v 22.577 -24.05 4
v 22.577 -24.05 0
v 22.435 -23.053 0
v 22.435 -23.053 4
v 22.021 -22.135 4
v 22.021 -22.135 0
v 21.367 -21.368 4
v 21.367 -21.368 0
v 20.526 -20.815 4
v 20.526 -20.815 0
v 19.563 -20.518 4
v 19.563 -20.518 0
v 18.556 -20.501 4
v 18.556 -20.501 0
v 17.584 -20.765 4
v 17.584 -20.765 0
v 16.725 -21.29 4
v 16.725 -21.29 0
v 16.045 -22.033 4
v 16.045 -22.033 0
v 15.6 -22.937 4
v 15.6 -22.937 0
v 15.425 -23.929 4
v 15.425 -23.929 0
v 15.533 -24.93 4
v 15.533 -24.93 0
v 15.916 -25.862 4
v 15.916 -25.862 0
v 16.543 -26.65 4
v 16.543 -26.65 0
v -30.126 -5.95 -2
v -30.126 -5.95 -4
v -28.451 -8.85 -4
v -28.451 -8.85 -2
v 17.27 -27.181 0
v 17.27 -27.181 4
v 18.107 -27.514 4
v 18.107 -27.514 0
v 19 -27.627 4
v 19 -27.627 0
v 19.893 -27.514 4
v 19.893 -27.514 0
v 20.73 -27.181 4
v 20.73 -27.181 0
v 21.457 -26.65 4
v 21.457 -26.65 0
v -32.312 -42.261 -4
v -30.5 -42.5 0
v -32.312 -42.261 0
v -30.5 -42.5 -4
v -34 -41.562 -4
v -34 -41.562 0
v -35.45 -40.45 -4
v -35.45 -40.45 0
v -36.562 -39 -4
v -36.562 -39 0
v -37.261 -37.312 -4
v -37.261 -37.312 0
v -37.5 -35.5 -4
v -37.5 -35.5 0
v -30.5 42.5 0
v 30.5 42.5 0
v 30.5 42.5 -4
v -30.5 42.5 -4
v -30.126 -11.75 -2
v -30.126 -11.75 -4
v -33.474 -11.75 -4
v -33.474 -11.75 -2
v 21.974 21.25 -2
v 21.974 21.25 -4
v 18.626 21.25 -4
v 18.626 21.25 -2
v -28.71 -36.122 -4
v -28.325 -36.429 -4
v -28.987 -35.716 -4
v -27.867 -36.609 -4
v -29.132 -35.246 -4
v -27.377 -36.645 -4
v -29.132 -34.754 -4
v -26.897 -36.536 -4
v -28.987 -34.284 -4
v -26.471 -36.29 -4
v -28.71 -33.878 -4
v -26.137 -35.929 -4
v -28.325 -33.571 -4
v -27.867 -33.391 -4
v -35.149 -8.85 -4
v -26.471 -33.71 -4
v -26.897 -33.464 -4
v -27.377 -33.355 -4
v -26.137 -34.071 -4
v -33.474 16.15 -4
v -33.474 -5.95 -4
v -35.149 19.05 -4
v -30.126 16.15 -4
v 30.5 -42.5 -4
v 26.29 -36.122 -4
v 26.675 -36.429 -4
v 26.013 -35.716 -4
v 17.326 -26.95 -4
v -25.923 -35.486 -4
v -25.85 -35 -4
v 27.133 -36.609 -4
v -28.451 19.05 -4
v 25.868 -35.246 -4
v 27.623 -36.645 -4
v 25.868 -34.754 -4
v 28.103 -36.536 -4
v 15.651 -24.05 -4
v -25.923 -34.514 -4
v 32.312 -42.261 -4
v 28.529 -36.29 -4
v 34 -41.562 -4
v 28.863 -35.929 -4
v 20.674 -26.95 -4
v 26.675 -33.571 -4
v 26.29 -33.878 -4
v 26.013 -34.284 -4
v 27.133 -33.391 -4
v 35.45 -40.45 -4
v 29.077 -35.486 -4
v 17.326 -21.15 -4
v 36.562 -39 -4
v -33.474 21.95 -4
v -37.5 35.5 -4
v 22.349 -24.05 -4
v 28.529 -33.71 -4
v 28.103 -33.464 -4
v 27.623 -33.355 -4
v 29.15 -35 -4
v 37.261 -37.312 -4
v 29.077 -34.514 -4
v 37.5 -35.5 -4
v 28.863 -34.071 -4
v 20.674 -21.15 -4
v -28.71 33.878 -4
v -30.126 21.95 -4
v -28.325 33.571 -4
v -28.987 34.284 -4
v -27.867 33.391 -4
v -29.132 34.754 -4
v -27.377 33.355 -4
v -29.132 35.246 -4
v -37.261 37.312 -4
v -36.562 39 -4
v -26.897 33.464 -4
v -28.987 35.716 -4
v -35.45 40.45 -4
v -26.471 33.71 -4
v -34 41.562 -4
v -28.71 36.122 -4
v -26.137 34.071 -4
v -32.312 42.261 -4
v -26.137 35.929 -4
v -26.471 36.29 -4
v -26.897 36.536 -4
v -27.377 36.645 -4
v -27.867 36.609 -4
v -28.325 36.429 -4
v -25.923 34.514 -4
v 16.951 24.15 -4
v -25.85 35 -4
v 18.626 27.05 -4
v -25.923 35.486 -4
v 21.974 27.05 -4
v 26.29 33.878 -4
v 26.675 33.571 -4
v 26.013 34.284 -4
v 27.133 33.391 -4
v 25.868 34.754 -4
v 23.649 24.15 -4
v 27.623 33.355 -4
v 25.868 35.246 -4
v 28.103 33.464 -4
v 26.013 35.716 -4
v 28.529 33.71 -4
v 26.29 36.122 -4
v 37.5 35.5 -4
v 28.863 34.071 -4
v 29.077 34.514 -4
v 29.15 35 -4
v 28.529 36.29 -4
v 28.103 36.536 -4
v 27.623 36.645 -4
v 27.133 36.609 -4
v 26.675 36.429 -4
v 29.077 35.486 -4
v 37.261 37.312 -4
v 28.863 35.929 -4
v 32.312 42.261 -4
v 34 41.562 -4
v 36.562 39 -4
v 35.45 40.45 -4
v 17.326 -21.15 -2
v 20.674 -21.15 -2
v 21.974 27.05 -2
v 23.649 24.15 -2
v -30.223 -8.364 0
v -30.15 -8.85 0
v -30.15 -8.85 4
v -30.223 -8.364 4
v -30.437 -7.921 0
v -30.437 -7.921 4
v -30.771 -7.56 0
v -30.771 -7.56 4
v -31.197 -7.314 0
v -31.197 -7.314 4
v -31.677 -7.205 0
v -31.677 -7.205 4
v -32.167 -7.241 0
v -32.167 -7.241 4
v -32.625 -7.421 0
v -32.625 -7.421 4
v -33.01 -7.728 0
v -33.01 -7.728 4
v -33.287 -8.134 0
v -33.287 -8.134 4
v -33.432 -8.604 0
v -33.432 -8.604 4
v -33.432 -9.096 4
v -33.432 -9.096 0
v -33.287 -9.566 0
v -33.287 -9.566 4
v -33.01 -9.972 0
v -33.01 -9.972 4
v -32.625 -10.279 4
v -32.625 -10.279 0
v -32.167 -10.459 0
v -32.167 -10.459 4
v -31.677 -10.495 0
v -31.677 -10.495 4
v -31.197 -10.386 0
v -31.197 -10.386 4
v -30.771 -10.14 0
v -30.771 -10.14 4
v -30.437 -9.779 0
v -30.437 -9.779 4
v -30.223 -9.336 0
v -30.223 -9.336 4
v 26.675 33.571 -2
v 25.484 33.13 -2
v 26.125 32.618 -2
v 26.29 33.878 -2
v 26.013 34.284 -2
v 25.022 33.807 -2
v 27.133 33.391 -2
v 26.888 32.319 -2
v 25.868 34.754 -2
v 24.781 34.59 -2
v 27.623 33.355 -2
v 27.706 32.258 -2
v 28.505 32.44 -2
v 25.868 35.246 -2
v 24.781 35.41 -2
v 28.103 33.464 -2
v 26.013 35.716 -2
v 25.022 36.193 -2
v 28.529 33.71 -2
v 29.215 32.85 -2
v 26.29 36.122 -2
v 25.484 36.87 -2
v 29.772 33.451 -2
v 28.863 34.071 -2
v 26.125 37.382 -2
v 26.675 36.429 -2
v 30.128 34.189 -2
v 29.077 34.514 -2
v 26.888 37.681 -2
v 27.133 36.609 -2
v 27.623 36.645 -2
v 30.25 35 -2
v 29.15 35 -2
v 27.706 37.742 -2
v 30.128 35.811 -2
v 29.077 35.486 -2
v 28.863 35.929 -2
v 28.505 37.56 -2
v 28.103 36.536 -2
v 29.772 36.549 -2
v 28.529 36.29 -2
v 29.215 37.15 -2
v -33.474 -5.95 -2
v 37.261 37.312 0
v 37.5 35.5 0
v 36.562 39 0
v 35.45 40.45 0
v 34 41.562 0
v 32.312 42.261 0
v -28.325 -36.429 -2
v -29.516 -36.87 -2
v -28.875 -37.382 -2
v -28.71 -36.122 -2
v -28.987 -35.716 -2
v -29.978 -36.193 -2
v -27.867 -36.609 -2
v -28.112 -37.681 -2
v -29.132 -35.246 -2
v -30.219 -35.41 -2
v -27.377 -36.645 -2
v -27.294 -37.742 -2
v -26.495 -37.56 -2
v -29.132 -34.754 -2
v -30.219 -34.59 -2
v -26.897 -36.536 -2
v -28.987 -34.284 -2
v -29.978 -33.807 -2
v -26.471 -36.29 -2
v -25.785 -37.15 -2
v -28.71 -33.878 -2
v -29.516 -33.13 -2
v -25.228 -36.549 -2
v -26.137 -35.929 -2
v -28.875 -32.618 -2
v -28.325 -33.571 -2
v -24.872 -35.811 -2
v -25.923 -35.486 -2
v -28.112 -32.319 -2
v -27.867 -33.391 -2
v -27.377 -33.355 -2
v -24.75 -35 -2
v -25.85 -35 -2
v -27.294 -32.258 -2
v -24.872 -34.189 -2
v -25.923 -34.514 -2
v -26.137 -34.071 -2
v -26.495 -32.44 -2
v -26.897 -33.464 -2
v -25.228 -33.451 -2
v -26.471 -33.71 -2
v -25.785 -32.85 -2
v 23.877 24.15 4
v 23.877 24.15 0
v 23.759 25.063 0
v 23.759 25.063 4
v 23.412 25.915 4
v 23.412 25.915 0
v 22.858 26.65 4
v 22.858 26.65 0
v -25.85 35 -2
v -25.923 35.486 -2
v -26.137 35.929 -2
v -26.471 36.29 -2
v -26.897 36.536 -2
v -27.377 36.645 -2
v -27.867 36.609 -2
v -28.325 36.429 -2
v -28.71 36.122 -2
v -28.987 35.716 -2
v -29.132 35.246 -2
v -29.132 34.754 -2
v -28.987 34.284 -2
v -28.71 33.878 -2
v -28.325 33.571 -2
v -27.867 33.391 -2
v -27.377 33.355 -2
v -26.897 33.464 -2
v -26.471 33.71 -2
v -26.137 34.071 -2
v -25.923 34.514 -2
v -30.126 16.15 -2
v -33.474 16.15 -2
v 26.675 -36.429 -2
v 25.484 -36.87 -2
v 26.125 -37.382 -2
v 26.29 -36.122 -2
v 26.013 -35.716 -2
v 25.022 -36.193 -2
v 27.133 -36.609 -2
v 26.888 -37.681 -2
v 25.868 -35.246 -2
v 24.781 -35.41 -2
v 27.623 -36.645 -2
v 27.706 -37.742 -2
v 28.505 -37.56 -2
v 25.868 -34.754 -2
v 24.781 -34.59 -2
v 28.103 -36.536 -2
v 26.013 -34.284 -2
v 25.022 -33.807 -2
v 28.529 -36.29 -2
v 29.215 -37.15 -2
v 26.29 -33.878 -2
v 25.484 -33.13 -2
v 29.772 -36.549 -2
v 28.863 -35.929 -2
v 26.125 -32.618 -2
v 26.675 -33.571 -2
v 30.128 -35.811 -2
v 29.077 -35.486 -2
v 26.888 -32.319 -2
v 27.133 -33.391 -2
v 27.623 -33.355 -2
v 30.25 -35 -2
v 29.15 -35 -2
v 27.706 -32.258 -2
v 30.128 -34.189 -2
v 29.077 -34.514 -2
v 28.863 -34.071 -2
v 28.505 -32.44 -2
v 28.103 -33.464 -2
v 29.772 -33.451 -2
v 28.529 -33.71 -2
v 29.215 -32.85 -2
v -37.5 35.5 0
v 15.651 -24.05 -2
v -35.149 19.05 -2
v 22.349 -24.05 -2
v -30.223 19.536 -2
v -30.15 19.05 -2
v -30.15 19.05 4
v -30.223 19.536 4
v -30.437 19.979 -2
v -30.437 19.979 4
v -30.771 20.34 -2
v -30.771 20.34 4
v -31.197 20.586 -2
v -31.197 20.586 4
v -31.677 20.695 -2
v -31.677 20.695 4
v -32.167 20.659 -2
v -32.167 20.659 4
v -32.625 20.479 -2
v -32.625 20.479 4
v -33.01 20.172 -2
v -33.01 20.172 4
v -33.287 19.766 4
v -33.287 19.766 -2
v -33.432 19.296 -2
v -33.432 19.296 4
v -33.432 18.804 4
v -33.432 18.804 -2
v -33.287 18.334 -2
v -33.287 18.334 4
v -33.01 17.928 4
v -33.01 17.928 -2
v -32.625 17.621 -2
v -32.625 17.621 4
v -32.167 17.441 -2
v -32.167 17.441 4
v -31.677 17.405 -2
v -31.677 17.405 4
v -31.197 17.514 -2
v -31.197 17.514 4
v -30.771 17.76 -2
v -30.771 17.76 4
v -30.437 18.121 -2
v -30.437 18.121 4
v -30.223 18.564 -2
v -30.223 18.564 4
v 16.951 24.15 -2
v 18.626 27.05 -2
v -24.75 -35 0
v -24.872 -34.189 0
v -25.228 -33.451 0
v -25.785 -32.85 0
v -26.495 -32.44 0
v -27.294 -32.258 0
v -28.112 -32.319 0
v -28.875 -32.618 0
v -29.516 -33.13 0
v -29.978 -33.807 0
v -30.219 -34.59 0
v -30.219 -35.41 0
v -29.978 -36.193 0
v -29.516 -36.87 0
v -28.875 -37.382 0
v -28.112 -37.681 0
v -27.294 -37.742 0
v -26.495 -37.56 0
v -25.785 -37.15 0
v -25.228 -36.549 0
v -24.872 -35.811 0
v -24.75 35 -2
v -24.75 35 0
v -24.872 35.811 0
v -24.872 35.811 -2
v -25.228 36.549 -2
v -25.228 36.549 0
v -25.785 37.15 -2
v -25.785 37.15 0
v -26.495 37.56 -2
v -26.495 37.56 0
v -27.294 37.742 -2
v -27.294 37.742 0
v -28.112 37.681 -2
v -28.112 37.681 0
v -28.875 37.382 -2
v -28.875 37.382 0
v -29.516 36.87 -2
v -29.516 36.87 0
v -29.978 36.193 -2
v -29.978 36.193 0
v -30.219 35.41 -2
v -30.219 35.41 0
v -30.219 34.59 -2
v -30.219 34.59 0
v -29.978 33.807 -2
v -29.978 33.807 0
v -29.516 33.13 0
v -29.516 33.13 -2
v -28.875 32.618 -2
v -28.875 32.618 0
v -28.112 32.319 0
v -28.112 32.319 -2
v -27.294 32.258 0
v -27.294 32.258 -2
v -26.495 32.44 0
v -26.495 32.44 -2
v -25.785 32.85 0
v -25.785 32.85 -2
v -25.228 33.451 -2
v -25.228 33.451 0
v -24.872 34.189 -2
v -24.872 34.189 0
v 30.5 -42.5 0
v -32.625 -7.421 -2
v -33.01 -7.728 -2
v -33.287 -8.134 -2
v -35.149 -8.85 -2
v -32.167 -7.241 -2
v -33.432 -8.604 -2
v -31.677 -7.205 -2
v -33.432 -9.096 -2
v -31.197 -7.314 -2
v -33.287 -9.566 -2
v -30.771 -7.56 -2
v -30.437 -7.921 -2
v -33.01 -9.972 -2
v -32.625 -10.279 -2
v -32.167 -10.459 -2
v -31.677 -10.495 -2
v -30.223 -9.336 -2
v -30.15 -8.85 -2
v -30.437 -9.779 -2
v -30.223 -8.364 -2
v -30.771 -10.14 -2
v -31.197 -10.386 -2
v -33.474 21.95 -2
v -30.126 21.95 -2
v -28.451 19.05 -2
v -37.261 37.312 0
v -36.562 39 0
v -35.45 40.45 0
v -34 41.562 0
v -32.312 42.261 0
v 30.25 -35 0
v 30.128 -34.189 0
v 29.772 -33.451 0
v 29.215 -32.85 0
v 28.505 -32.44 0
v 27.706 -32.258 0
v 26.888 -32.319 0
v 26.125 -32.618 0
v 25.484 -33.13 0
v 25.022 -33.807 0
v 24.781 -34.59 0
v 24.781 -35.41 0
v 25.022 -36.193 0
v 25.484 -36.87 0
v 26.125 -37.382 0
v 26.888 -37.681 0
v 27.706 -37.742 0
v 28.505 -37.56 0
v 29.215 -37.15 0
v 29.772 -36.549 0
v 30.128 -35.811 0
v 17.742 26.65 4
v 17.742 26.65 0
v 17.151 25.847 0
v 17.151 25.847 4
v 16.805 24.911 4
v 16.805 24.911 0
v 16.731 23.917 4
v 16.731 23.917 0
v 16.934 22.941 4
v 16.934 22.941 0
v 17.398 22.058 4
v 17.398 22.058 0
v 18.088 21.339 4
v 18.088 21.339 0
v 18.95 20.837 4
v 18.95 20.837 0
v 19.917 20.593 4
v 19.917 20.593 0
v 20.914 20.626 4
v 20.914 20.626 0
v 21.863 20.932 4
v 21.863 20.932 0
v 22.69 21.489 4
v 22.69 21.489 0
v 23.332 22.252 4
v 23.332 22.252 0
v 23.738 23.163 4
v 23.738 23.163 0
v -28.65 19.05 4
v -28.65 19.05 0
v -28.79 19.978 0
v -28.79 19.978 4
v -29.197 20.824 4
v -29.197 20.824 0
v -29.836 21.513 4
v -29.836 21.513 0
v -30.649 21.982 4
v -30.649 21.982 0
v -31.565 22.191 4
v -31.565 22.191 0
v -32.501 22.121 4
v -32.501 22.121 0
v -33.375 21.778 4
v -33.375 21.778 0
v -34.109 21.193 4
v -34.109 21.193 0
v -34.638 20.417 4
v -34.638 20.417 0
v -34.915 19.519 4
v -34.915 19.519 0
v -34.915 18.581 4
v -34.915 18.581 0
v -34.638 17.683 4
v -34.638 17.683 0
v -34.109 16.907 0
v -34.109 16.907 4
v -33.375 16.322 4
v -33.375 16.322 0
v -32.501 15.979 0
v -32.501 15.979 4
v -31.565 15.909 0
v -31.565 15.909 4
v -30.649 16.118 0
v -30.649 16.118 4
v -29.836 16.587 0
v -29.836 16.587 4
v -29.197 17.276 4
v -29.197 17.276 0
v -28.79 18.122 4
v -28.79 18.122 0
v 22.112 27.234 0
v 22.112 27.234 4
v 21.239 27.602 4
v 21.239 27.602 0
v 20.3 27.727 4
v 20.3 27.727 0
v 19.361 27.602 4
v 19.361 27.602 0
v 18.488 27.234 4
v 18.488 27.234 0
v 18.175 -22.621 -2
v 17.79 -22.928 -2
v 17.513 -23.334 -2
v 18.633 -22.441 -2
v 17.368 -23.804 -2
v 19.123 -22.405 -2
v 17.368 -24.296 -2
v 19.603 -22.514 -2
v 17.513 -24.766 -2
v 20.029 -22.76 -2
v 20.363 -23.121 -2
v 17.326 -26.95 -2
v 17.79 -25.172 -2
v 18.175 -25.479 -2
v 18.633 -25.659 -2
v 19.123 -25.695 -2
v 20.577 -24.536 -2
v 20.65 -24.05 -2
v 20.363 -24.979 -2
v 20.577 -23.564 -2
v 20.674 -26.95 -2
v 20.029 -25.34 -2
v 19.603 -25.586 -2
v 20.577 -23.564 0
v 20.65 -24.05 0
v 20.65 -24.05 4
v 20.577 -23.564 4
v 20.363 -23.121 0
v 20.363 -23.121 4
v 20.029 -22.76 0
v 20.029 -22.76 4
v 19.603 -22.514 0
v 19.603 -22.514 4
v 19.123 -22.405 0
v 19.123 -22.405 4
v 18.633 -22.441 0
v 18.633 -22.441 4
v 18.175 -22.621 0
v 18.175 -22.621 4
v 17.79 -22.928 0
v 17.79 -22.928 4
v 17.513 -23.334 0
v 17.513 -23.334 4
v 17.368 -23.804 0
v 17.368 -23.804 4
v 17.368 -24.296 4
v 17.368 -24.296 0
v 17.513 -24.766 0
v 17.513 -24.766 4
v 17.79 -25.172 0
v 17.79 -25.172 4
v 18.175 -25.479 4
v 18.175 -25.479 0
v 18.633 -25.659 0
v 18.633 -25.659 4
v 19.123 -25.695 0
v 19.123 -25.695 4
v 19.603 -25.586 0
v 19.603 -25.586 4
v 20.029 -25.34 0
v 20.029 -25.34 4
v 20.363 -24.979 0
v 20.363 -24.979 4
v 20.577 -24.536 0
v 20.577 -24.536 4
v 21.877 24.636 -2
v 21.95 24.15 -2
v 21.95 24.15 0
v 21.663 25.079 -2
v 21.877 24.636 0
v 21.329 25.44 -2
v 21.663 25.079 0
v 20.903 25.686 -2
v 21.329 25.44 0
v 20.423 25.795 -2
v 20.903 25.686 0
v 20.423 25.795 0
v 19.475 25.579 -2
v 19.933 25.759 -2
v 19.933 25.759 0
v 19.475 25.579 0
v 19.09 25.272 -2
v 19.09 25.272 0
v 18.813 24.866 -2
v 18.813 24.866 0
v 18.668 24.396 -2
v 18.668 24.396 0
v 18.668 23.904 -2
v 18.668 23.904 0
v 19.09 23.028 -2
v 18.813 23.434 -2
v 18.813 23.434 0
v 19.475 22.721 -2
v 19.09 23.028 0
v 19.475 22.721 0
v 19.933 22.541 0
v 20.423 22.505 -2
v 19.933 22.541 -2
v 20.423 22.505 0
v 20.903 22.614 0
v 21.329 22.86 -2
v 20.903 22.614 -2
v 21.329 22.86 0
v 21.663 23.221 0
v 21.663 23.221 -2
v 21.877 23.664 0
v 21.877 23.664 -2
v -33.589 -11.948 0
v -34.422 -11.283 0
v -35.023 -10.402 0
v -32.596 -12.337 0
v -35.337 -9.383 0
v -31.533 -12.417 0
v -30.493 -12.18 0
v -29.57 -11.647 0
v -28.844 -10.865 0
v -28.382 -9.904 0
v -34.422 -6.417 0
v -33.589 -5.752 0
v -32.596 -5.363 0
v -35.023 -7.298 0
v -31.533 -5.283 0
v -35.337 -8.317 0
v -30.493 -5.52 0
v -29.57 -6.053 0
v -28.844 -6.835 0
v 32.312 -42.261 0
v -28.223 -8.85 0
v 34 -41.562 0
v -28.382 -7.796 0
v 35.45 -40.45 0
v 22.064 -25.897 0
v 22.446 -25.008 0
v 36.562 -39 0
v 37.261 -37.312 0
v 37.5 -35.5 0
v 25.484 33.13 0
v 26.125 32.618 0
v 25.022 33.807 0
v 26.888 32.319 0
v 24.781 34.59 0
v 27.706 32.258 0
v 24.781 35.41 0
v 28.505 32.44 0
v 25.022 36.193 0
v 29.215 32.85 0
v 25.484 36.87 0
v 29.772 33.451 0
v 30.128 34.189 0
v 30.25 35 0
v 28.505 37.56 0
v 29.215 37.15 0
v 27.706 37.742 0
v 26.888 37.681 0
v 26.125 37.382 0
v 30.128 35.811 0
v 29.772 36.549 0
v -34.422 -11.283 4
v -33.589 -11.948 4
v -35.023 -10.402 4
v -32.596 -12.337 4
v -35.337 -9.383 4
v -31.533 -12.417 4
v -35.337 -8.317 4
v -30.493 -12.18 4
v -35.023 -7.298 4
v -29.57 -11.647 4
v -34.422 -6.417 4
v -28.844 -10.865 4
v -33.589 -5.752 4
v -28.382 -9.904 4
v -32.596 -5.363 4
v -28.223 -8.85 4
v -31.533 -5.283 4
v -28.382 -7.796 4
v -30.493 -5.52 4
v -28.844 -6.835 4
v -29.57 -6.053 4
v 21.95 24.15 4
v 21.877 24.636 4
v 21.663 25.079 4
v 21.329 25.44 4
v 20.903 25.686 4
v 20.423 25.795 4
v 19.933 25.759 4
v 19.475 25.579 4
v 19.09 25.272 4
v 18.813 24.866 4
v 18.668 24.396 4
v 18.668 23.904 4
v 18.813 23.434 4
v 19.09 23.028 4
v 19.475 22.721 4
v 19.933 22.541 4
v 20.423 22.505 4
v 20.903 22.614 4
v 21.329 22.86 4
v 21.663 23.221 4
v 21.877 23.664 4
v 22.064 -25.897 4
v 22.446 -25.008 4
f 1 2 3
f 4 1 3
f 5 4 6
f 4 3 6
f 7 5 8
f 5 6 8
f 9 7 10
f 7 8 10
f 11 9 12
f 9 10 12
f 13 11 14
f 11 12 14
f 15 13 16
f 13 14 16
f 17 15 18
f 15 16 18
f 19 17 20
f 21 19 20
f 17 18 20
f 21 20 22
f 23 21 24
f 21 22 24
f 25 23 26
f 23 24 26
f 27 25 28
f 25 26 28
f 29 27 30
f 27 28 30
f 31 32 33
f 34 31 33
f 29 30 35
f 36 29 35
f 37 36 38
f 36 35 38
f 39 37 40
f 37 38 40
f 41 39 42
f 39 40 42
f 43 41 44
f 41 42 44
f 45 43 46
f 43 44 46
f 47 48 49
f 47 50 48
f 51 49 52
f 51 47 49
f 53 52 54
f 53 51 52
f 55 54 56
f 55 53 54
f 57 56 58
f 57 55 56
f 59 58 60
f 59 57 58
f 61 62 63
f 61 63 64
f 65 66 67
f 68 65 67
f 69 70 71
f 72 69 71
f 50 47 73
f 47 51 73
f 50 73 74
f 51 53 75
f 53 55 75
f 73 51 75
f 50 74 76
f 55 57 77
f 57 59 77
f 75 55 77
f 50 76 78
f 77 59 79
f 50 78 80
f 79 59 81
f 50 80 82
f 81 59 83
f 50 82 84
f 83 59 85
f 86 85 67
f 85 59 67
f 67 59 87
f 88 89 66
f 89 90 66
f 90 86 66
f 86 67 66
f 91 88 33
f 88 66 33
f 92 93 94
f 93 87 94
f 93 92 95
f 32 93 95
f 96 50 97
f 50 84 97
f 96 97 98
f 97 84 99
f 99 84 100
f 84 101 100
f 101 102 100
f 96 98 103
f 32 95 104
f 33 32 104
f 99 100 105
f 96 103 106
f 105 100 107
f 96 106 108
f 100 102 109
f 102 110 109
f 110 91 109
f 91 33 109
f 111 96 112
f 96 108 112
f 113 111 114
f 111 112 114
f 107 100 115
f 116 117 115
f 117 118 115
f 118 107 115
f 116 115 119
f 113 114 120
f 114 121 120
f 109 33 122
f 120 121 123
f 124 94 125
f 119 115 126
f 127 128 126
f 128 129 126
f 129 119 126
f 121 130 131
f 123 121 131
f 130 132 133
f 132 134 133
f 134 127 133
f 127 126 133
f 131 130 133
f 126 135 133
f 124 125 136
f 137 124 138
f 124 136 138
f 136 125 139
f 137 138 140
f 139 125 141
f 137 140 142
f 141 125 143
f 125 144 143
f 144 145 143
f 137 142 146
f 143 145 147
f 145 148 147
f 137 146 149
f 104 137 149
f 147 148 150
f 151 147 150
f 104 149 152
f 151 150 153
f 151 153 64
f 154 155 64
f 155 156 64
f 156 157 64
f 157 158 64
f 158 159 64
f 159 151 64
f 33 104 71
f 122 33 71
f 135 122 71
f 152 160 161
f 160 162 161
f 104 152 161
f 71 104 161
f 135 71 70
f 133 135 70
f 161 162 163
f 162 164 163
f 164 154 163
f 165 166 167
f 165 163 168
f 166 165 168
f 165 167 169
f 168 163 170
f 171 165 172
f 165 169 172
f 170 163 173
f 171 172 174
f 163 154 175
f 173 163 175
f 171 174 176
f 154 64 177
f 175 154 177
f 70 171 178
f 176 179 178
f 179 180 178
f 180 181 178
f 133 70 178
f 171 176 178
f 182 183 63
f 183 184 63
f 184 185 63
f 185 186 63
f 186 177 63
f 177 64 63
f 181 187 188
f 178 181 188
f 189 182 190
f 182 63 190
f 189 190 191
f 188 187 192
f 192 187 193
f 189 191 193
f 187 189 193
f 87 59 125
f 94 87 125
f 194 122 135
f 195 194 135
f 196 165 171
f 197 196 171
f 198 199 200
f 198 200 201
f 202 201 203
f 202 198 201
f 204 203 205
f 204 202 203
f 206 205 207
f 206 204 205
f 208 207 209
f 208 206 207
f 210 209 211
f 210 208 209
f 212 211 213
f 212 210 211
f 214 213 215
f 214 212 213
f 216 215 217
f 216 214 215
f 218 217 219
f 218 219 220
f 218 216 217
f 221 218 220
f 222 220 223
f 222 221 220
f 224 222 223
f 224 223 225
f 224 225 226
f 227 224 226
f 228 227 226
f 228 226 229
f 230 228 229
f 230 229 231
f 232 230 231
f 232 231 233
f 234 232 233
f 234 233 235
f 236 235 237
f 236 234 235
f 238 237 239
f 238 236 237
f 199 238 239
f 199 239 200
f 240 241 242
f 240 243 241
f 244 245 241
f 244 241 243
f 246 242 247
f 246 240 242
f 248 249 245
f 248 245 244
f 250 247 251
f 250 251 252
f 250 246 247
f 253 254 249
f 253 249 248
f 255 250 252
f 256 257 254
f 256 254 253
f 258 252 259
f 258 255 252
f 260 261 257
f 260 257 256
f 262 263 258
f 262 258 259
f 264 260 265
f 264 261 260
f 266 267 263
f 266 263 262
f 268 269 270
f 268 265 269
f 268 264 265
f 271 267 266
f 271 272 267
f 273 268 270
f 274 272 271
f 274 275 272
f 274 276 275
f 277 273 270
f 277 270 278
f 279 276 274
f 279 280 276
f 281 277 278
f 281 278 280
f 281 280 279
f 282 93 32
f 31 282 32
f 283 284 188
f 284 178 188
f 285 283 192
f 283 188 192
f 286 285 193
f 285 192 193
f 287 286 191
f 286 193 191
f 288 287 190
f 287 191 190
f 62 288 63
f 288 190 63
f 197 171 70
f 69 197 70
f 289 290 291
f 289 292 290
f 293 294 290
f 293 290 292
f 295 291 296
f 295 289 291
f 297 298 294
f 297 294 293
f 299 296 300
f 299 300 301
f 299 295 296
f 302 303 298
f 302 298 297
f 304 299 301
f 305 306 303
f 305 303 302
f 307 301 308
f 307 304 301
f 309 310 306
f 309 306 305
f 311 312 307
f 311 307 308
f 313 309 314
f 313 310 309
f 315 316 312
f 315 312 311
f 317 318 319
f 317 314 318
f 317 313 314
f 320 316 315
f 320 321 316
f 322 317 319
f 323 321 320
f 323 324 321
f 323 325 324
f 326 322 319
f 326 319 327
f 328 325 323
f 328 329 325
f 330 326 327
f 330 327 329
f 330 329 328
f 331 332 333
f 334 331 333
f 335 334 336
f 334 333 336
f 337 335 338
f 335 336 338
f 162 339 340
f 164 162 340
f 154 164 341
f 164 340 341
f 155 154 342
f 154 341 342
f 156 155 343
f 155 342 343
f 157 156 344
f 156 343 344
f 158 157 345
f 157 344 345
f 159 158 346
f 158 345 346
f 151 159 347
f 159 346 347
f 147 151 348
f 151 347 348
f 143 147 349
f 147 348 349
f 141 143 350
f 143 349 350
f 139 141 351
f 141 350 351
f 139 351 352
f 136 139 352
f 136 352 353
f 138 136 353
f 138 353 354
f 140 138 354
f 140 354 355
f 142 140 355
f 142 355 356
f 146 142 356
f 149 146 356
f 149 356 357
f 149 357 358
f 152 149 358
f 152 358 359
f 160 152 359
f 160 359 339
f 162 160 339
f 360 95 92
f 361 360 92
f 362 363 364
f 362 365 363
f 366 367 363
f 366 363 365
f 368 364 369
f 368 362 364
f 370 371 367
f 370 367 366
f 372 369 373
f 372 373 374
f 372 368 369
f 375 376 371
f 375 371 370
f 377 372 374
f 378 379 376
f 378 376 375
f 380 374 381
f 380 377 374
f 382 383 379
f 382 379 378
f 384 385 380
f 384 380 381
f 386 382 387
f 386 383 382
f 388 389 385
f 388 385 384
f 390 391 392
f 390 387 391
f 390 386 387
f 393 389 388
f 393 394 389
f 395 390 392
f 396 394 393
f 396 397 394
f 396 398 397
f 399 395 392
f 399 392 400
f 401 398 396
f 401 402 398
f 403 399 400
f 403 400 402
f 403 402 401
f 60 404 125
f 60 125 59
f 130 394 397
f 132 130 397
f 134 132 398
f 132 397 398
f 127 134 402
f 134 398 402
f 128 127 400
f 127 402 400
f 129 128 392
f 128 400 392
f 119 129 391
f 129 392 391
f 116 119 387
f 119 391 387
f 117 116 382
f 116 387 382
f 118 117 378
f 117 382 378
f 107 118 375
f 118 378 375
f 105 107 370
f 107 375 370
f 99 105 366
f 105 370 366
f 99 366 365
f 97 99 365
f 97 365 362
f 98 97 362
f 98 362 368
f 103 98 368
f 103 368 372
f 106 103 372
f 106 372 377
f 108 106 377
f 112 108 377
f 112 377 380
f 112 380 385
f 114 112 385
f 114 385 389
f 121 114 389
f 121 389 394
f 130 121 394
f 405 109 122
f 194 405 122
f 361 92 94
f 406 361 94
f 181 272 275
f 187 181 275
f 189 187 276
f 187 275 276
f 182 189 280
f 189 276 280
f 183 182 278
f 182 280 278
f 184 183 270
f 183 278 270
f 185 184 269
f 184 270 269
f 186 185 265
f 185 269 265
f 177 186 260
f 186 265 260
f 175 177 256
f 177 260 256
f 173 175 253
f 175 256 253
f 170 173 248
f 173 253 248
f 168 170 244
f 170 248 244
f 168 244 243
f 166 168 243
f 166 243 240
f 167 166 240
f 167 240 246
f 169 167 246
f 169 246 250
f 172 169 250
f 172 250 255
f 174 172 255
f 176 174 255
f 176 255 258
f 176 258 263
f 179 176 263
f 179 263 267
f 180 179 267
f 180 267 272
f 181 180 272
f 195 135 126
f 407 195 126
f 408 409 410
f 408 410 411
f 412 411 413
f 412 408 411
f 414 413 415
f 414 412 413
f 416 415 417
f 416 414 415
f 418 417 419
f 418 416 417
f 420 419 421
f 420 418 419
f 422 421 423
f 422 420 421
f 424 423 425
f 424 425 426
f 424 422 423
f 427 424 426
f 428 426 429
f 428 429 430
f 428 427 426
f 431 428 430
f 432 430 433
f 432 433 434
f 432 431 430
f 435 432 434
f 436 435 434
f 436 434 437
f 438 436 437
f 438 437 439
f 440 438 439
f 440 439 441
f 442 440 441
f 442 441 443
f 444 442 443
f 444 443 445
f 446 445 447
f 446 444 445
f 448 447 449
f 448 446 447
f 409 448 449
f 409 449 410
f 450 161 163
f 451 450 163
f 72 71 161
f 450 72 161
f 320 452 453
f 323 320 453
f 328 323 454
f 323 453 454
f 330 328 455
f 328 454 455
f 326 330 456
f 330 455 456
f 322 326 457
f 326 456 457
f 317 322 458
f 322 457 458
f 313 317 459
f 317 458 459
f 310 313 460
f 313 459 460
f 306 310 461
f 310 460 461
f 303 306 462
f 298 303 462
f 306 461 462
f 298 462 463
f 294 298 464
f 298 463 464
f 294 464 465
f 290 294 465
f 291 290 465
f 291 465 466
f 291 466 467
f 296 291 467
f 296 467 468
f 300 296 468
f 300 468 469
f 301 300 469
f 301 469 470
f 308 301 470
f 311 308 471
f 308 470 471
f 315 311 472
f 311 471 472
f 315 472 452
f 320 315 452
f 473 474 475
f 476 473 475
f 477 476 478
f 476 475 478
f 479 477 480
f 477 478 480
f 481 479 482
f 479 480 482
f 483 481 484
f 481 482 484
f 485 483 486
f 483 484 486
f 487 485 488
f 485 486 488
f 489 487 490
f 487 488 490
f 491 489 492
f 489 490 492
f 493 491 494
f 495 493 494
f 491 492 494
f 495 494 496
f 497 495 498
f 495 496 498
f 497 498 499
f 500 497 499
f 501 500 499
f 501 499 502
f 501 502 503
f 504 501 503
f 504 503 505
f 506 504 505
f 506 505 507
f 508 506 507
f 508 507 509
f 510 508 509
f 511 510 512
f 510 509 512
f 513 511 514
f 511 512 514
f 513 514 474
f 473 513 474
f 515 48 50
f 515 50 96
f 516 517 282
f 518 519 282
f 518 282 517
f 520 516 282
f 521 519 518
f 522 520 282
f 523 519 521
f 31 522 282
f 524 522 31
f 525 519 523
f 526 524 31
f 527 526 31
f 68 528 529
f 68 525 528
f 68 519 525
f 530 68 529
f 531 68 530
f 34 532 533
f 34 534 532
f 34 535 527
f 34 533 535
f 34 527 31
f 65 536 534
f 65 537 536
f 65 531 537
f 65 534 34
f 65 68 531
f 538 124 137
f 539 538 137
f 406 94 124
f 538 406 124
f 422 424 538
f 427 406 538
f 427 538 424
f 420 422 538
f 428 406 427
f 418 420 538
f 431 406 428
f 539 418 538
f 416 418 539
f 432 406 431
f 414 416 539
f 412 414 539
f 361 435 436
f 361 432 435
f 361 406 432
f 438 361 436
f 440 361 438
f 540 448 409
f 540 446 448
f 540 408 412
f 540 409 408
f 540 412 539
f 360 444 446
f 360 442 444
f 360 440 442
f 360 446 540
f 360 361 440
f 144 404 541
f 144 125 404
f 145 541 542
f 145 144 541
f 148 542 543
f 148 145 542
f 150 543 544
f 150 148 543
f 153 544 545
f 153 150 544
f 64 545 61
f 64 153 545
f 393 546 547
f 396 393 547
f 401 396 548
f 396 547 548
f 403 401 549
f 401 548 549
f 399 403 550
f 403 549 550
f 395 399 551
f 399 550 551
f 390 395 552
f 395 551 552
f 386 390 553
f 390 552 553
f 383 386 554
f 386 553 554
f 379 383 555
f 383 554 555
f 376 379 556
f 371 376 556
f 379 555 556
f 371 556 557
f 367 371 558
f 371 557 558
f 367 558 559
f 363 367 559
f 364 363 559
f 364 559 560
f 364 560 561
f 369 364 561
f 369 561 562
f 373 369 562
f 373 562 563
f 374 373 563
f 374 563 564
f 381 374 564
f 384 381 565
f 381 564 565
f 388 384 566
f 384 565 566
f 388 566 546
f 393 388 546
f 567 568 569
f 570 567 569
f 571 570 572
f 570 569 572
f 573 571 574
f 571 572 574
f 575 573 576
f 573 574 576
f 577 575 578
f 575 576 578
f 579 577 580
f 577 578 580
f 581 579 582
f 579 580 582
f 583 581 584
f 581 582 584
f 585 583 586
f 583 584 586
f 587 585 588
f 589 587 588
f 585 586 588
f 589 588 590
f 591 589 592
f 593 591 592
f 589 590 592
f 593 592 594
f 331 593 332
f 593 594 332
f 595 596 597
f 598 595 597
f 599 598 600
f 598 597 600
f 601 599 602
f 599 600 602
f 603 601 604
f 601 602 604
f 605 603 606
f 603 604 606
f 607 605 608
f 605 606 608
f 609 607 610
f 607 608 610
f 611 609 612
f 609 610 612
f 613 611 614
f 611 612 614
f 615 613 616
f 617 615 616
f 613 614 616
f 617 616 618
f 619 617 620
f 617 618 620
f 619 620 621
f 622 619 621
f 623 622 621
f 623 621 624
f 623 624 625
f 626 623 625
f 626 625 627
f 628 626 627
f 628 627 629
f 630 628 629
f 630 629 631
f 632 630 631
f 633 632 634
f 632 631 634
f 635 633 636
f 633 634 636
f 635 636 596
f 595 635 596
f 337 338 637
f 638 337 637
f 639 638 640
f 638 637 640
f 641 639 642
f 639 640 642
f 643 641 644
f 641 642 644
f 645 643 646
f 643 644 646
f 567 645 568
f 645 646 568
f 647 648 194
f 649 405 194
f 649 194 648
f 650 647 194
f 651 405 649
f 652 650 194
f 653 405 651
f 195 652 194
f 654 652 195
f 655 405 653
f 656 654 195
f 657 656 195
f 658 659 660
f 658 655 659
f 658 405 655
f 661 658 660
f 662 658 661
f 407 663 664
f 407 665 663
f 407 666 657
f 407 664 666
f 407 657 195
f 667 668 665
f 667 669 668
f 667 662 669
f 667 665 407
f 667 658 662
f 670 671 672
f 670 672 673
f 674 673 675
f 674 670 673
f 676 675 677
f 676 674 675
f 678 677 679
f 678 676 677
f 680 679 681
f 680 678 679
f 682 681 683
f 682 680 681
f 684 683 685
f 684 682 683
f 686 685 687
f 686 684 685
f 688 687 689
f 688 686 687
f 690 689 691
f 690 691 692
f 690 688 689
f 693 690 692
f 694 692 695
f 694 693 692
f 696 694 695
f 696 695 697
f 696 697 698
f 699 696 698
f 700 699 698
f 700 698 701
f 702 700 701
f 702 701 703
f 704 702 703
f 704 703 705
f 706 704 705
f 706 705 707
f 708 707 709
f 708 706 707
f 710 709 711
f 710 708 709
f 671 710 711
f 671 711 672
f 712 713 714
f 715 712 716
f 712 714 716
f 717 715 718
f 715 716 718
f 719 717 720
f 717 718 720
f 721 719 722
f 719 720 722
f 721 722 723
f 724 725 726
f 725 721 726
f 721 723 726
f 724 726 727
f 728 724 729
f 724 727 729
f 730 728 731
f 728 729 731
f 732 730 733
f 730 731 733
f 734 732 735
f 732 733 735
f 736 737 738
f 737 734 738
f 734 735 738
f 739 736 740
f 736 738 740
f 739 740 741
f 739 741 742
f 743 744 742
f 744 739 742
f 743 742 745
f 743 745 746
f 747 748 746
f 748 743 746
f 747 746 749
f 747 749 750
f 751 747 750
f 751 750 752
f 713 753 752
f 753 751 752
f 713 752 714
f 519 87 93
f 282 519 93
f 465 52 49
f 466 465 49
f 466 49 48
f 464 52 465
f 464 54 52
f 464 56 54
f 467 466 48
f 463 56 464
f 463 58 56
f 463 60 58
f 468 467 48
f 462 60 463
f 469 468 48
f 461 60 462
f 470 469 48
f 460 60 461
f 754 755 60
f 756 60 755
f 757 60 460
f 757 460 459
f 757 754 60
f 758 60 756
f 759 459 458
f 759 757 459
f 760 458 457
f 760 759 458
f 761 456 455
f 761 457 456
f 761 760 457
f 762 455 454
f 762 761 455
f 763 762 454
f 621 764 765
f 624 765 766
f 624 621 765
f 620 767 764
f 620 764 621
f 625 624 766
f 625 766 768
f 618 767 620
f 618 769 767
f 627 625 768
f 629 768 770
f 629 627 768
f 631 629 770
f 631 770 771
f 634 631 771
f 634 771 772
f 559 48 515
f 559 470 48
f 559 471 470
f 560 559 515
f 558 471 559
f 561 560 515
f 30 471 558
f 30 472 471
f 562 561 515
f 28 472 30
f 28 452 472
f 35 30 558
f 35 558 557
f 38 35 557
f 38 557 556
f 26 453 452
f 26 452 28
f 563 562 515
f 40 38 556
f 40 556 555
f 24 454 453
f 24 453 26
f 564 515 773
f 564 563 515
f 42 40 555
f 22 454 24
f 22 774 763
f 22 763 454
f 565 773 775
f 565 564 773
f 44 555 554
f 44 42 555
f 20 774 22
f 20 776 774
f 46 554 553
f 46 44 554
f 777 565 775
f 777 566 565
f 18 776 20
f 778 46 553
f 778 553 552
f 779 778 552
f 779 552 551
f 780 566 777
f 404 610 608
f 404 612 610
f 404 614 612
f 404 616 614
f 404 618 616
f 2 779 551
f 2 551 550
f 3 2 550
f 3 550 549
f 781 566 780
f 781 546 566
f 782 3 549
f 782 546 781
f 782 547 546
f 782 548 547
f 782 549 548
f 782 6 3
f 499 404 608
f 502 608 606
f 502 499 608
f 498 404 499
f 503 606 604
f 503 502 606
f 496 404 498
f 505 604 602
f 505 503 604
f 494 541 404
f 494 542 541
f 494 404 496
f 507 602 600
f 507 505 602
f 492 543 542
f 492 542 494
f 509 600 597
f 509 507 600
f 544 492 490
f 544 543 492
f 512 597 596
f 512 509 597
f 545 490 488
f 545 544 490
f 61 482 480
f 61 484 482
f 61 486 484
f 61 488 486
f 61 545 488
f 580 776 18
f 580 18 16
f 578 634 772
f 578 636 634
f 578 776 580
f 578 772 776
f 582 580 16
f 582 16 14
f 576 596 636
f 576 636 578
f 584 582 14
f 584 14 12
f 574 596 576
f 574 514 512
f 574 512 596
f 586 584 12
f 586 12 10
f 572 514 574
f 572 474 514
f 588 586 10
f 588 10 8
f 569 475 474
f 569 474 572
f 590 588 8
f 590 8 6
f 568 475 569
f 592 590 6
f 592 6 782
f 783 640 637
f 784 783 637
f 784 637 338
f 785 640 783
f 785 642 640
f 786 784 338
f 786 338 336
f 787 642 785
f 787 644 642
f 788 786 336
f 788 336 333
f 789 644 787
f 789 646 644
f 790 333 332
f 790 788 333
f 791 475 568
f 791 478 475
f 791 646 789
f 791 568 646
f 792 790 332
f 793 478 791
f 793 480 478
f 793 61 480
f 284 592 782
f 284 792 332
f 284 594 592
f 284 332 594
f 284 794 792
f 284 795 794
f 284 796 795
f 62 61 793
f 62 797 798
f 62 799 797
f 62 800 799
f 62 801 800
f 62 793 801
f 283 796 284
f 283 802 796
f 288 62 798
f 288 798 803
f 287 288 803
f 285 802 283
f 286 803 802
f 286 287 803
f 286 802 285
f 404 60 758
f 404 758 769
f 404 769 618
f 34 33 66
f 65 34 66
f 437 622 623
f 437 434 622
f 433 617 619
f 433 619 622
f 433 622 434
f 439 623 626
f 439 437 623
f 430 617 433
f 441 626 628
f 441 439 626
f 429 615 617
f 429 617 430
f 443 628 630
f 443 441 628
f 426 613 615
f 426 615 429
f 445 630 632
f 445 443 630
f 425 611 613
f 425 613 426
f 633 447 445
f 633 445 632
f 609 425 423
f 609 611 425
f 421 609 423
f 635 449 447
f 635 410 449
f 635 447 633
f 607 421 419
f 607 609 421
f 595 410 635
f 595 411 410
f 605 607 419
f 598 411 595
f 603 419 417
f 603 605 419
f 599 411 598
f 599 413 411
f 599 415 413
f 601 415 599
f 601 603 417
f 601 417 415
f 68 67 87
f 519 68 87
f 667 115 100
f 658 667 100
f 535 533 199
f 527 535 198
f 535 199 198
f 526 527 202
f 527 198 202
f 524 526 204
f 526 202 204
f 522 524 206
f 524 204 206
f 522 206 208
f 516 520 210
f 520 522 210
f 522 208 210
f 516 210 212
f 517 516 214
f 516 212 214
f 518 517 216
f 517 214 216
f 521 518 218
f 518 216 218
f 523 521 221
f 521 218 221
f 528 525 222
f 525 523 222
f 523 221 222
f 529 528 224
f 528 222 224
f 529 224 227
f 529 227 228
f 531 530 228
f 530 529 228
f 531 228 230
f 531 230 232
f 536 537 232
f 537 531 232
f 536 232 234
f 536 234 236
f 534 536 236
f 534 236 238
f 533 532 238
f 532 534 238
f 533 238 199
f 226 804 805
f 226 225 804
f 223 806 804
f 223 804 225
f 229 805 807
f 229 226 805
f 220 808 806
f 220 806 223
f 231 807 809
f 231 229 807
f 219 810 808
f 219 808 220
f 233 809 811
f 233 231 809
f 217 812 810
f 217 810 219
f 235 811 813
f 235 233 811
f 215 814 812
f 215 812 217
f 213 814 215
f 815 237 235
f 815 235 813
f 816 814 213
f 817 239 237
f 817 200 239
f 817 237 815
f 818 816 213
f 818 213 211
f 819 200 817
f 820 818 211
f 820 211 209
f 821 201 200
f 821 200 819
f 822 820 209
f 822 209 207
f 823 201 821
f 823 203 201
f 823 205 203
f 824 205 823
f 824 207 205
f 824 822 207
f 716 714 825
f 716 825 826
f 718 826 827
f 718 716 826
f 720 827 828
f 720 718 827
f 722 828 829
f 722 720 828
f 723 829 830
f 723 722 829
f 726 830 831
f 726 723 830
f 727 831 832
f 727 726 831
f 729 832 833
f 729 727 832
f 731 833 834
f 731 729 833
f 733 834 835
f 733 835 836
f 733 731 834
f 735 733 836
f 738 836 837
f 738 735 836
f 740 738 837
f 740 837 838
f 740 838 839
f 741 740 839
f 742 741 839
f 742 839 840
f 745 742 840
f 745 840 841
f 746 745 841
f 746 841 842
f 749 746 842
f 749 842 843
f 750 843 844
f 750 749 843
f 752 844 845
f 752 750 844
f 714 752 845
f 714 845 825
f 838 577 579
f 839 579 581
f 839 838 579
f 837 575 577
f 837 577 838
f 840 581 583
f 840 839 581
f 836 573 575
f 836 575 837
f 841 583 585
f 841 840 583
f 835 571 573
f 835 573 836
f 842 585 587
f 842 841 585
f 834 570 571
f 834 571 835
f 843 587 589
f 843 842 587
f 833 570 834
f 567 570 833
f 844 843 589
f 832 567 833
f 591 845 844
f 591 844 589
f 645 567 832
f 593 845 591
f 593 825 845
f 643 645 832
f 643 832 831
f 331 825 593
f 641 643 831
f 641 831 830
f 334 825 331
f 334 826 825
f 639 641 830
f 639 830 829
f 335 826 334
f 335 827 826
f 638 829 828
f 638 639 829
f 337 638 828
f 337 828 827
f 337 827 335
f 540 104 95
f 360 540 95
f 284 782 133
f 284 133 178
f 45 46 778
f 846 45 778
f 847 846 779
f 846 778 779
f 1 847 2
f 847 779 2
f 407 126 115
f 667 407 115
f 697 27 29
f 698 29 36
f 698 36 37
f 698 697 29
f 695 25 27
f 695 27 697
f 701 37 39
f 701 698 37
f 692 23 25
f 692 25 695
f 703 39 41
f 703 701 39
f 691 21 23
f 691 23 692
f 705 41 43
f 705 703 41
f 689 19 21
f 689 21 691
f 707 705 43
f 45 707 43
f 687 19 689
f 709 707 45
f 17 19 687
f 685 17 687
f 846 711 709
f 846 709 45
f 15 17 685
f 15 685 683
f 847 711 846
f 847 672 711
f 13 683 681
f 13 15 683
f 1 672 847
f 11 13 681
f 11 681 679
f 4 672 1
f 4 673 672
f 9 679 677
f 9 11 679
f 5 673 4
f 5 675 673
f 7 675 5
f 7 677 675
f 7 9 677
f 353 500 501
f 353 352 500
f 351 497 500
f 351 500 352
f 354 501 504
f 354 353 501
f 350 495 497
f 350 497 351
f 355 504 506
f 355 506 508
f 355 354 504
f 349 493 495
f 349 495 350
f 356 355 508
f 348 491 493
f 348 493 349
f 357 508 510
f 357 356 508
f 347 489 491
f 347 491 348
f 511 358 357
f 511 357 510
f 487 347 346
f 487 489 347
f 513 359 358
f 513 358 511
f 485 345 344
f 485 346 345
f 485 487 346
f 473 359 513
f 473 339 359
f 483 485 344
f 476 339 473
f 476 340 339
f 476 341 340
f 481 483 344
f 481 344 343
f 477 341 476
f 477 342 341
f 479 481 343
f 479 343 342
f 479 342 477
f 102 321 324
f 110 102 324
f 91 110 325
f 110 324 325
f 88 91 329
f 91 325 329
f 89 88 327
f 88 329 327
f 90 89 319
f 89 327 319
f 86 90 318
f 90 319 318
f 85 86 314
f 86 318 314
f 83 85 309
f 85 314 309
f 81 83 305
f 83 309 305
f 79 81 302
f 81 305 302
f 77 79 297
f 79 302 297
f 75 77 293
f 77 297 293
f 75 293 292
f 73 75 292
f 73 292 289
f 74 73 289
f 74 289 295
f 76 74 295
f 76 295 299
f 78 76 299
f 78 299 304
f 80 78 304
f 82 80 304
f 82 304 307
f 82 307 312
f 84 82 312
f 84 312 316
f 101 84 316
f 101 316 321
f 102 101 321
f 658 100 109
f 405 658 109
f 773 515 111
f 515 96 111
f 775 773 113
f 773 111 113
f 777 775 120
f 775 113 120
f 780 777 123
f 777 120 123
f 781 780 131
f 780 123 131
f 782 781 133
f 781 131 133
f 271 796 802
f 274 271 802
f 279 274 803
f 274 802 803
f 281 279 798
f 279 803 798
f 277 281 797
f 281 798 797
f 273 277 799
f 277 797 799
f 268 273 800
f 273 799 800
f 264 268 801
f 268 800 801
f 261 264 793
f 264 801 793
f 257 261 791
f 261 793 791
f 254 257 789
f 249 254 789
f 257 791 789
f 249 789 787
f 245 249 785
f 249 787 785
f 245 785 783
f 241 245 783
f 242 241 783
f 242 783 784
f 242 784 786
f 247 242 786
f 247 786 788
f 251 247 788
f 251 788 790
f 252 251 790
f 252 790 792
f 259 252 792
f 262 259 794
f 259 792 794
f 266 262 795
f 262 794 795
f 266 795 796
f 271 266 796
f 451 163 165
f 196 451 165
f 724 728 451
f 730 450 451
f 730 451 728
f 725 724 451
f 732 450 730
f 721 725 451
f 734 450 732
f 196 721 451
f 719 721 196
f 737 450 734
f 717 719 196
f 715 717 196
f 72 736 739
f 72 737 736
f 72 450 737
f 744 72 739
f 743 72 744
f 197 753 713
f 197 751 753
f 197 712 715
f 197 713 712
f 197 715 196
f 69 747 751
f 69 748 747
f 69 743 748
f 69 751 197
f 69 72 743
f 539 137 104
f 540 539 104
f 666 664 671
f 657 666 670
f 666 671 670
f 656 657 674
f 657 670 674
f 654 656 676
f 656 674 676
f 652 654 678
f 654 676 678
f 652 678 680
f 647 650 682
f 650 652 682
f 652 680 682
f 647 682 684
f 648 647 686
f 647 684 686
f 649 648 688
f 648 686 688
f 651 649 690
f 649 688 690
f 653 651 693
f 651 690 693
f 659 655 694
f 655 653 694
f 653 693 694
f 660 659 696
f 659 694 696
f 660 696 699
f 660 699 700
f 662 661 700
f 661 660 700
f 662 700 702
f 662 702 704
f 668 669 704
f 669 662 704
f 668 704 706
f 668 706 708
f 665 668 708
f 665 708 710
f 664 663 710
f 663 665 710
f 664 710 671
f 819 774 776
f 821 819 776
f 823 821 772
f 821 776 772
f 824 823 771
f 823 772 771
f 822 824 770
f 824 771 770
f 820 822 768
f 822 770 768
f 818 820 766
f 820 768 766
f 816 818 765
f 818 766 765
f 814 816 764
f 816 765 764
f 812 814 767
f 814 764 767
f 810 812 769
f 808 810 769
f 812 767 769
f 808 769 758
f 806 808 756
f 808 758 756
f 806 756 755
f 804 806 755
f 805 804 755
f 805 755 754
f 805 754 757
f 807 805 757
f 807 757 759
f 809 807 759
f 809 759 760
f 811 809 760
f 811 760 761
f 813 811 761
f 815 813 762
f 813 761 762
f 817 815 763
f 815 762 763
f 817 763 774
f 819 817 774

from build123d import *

# Parameters (mm, degrees)
F0_R     = 3.5770918181
F0_R_2   = 3.15
F0_R_3   = 2.75
F0_R_4   = 1.65
F1_DEPTH = 4
F2_DEPTH = 4
F3_DEPTH = 2
F4_R     = 1.65
F5_DEPTH = 2
F6_R     = 7


with BuildPart() as f1:
    # F0 (on Top) → F1 (new body)
    with BuildSketch(Plane.XY):
        with BuildLine():
            Line((17.7415657376, 26.65), (-37.5, 26.65))
            Line((-37.5, 26.65), (-37.5, -26.65))
            Line((-37.5, -26.65), (-34.3, -26.65))
            Line((-34.3, -26.65), (16.5432570596, -26.65))
            ThreePointArc((16.5432570596, -26.65), (17.5844451964, -20.7649139321), (22.5770918181, -24.05))
            ThreePointArc((22.5770918181, -24.05), (22.2850860679, -25.4655548036), (21.4567429404, -26.65))
            Line((21.4567429404, -26.65), (34.3, -26.65))
            Line((34.3, -26.65), (37.5, -26.65))
            Line((37.5, -26.65), (37.5, 26.65))
            Line((37.5, 26.65), (22.8584342624, 26.65))
            ThreePointArc((22.8584342624, 26.65), (23.6126530261, 25.4997836137), (23.8770918181, 24.15))
            ThreePointArc((23.8770918181, 24.15), (18.9502163863, 20.8373469739), (17.7415657376, 26.65))
        make_face()
        with Locations((-31.8, -8.85)):
            Circle(F0_R, mode=Mode.SUBTRACT)
        with Locations((-31.8, 19.05)):
            Circle(F0_R_2, mode=Mode.SUBTRACT)
        with BuildLine():
            Line((-34.3, -26.65), (-37.5, -26.65))
            Line((-37.5, -26.65), (-37.5, -42.5))
            Line((-37.5, -42.5), (37.5, -42.5))
            Line((37.5, -42.5), (37.5, -26.65))
            Line((37.5, -26.65), (34.3, -26.65))
            Line((34.3, -26.65), (21.4567429404, -26.65))
            ThreePointArc((21.4567429404, -26.65), (19, -27.6270918181), (16.5432570596, -26.65))
            Line((16.5432570596, -26.65), (-34.3, -26.65))
        make_face()
        with Locations((-27.5, -35)):
            Circle(F0_R_3, mode=Mode.SUBTRACT)
        with Locations((27.5, -35)):
            Circle(F0_R_3, mode=Mode.SUBTRACT)
        with BuildLine():
            Line((37.5, 42.5), (-37.5, 42.5))
            Line((-37.5, 42.5), (-37.5, 26.65))
            Line((-37.5, 26.65), (17.7415657376, 26.65))
            ThreePointArc((17.7415657376, 26.65), (20.3, 27.7270918181), (22.8584342624, 26.65))
            Line((22.8584342624, 26.65), (37.5, 26.65))
            Line((37.5, 26.65), (37.5, 42.5))
        make_face()
        with Locations((-27.5, 35)):
            Circle(F0_R_3, mode=Mode.SUBTRACT)
        with Locations((27.5, 35)):
            Circle(F0_R_3, mode=Mode.SUBTRACT)
        with Locations((-31.8, -8.85)):
            Circle(F0_R)
        with Locations((-31.8, -8.85)):
            Circle(F0_R_4, mode=Mode.SUBTRACT)
        with BuildLine():
            ThreePointArc((22.5770918181, -24.05), (17.5844451964, -20.7649139321), (16.5432570596, -26.65))
            Line((16.5432570596, -26.65), (21.4567429404, -26.65))
            ThreePointArc((21.4567429404, -26.65), (22.2850860679, -25.4655548036), (22.5770918181, -24.05))
        make_face()
        with Locations((19, -24.05)):
            Circle(F0_R_4, mode=Mode.SUBTRACT)
        with BuildLine():
            Line((22.8584342624, 26.65), (17.7415657376, 26.65))
            ThreePointArc((17.7415657376, 26.65), (18.9502163863, 20.8373469739), (23.8770918181, 24.15))
            ThreePointArc((23.8770918181, 24.15), (23.6126530261, 25.4997836137), (22.8584342624, 26.65))
        make_face()
        with Locations((20.3, 24.15)):
            Circle(F0_R_4, mode=Mode.SUBTRACT)
        with Locations((-31.8, 19.05)):
            Circle(F0_R_2)
        with Locations((-31.8, 19.05)):
            Circle(F0_R_4, mode=Mode.SUBTRACT)
        with Locations((-27.5, 35)):
            Circle(F0_R_3)
        with Locations((-27.5, 35)):
            Circle(F0_R_4, mode=Mode.SUBTRACT)
        with Locations((27.5, 35)):
            Circle(F0_R_3)
        with Locations((27.5, 35)):
            Circle(F0_R_4, mode=Mode.SUBTRACT)
        with Locations((-27.5, -35)):
            Circle(F0_R_3)
        with Locations((-27.5, -35)):
            Circle(F0_R_4, mode=Mode.SUBTRACT)
        with Locations((27.5, -35)):
            Circle(F0_R_3)
        with Locations((27.5, -35)):
            Circle(F0_R_4, mode=Mode.SUBTRACT)
        with BuildLine():
            ThreePointArc((22.8584342624, 26.65), (20.3, 27.7270918181), (17.7415657376, 26.65))
            Line((17.7415657376, 26.65), (22.8584342624, 26.65))
        make_face()
        with BuildLine():
            Line((21.4567429404, -26.65), (16.5432570596, -26.65))
            ThreePointArc((16.5432570596, -26.65), (19, -27.6270918181), (21.4567429404, -26.65))
        make_face()
    extrude(amount=-F1_DEPTH)

    # F0 (on Top) → F2 (join)
    with BuildSketch(Plane.XY):
        with Locations((-31.8, 19.05)):
            Circle(F0_R_2)
        with Locations((-31.8, 19.05)):
            Circle(F0_R_4, mode=Mode.SUBTRACT)
        with Locations((-31.8, -8.85)):
            Circle(F0_R)
        with Locations((-31.8, -8.85)):
            Circle(F0_R_4, mode=Mode.SUBTRACT)
        with BuildLine():
            Line((22.8584342624, 26.65), (17.7415657376, 26.65))
            ThreePointArc((17.7415657376, 26.65), (18.9502163863, 20.8373469739), (23.8770918181, 24.15))
            ThreePointArc((23.8770918181, 24.15), (23.6126530261, 25.4997836137), (22.8584342624, 26.65))
        make_face()
        with Locations((20.3, 24.15)):
            Circle(F0_R_4, mode=Mode.SUBTRACT)
        with BuildLine():
            ThreePointArc((22.8584342624, 26.65), (20.3, 27.7270918181), (17.7415657376, 26.65))
            Line((17.7415657376, 26.65), (22.8584342624, 26.65))
        make_face()
        with BuildLine():
            ThreePointArc((22.5770918181, -24.05), (17.5844451964, -20.7649139321), (16.5432570596, -26.65))
            Line((16.5432570596, -26.65), (21.4567429404, -26.65))
            ThreePointArc((21.4567429404, -26.65), (22.2850860679, -25.4655548036), (22.5770918181, -24.05))
        make_face()
        with Locations((19, -24.05)):
            Circle(F0_R_4, mode=Mode.SUBTRACT)
        with BuildLine():
            Line((21.4567429404, -26.65), (16.5432570596, -26.65))
            ThreePointArc((16.5432570596, -26.65), (19, -27.6270918181), (21.4567429404, -26.65))
        make_face()
    extrude(amount=F2_DEPTH)

    # F0 (on Top) → F3 (cut)
    with BuildSketch(Plane.XY):
        with Locations((-27.5, 35)):
            Circle(F0_R_3)
        with Locations((-27.5, 35)):
            Circle(F0_R_4, mode=Mode.SUBTRACT)
        with Locations((27.5, 35)):
            Circle(F0_R_3)
        with Locations((27.5, 35)):
            Circle(F0_R_4, mode=Mode.SUBTRACT)
        with Locations((-27.5, -35)):
            Circle(F0_R_3)
        with Locations((-27.5, -35)):
            Circle(F0_R_4, mode=Mode.SUBTRACT)
        with Locations((27.5, -35)):
            Circle(F0_R_3)
        with Locations((27.5, -35)):
            Circle(F0_R_4, mode=Mode.SUBTRACT)
    extrude(amount=-F3_DEPTH, mode=Mode.SUBTRACT)

    # F4 (on face) → F5 (cut)
    with BuildSketch(Plane(origin=(0, 0, -4), x_dir=(1, 0, 0), z_dir=(0, 0, -1))):
        Polygon((18.6256842194, -27.05), (21.9743157806, -27.05), (23.6486315613, -24.15), (21.9743157806, -21.25), (18.6256842194, -21.25), (16.9513684387, -24.15), align=None)
        with Locations((20.3, -24.15)):
            Circle(F4_R, mode=Mode.SUBTRACT)
        Polygon((-33.4743157806, -21.95), (-30.1256842194, -21.95), (-28.4513684387, -19.05), (-30.1256842194, -16.15), (-33.4743157806, -16.15), (-35.1486315613, -19.05), align=None)
        with Locations((-31.8, -19.05)):
            Circle(F4_R, mode=Mode.SUBTRACT)
        Polygon((17.3256842194, 21.15), (20.6743157806, 21.15), (22.3486315613, 24.05), (20.6743157806, 26.95), (17.3256842194, 26.95), (15.6513684387, 24.05), align=None)
        with Locations((19, 24.05)):
            Circle(F4_R, mode=Mode.SUBTRACT)
        Polygon((-33.4743157806, 5.95), (-30.1256842194, 5.95), (-28.4513684387, 8.85), (-30.1256842194, 11.75), (-33.4743157806, 11.75), (-35.1486315613, 8.85), align=None)
        with Locations((-31.8, 8.85)):
            Circle(F4_R, mode=Mode.SUBTRACT)
    extrude(amount=-F5_DEPTH, mode=Mode.SUBTRACT)

    # F6
    f6_edges = [f1.edges().sort_by_distance(p)[0] for p in [
        (-37.5, 42.5, -2),
        (-37.5, -42.5, -2),
        (37.5, -42.5, -2),
        (37.5, 42.5, -2),
    ]]
    fillet(f6_edges, radius=F6_R)


solid = f1.part
